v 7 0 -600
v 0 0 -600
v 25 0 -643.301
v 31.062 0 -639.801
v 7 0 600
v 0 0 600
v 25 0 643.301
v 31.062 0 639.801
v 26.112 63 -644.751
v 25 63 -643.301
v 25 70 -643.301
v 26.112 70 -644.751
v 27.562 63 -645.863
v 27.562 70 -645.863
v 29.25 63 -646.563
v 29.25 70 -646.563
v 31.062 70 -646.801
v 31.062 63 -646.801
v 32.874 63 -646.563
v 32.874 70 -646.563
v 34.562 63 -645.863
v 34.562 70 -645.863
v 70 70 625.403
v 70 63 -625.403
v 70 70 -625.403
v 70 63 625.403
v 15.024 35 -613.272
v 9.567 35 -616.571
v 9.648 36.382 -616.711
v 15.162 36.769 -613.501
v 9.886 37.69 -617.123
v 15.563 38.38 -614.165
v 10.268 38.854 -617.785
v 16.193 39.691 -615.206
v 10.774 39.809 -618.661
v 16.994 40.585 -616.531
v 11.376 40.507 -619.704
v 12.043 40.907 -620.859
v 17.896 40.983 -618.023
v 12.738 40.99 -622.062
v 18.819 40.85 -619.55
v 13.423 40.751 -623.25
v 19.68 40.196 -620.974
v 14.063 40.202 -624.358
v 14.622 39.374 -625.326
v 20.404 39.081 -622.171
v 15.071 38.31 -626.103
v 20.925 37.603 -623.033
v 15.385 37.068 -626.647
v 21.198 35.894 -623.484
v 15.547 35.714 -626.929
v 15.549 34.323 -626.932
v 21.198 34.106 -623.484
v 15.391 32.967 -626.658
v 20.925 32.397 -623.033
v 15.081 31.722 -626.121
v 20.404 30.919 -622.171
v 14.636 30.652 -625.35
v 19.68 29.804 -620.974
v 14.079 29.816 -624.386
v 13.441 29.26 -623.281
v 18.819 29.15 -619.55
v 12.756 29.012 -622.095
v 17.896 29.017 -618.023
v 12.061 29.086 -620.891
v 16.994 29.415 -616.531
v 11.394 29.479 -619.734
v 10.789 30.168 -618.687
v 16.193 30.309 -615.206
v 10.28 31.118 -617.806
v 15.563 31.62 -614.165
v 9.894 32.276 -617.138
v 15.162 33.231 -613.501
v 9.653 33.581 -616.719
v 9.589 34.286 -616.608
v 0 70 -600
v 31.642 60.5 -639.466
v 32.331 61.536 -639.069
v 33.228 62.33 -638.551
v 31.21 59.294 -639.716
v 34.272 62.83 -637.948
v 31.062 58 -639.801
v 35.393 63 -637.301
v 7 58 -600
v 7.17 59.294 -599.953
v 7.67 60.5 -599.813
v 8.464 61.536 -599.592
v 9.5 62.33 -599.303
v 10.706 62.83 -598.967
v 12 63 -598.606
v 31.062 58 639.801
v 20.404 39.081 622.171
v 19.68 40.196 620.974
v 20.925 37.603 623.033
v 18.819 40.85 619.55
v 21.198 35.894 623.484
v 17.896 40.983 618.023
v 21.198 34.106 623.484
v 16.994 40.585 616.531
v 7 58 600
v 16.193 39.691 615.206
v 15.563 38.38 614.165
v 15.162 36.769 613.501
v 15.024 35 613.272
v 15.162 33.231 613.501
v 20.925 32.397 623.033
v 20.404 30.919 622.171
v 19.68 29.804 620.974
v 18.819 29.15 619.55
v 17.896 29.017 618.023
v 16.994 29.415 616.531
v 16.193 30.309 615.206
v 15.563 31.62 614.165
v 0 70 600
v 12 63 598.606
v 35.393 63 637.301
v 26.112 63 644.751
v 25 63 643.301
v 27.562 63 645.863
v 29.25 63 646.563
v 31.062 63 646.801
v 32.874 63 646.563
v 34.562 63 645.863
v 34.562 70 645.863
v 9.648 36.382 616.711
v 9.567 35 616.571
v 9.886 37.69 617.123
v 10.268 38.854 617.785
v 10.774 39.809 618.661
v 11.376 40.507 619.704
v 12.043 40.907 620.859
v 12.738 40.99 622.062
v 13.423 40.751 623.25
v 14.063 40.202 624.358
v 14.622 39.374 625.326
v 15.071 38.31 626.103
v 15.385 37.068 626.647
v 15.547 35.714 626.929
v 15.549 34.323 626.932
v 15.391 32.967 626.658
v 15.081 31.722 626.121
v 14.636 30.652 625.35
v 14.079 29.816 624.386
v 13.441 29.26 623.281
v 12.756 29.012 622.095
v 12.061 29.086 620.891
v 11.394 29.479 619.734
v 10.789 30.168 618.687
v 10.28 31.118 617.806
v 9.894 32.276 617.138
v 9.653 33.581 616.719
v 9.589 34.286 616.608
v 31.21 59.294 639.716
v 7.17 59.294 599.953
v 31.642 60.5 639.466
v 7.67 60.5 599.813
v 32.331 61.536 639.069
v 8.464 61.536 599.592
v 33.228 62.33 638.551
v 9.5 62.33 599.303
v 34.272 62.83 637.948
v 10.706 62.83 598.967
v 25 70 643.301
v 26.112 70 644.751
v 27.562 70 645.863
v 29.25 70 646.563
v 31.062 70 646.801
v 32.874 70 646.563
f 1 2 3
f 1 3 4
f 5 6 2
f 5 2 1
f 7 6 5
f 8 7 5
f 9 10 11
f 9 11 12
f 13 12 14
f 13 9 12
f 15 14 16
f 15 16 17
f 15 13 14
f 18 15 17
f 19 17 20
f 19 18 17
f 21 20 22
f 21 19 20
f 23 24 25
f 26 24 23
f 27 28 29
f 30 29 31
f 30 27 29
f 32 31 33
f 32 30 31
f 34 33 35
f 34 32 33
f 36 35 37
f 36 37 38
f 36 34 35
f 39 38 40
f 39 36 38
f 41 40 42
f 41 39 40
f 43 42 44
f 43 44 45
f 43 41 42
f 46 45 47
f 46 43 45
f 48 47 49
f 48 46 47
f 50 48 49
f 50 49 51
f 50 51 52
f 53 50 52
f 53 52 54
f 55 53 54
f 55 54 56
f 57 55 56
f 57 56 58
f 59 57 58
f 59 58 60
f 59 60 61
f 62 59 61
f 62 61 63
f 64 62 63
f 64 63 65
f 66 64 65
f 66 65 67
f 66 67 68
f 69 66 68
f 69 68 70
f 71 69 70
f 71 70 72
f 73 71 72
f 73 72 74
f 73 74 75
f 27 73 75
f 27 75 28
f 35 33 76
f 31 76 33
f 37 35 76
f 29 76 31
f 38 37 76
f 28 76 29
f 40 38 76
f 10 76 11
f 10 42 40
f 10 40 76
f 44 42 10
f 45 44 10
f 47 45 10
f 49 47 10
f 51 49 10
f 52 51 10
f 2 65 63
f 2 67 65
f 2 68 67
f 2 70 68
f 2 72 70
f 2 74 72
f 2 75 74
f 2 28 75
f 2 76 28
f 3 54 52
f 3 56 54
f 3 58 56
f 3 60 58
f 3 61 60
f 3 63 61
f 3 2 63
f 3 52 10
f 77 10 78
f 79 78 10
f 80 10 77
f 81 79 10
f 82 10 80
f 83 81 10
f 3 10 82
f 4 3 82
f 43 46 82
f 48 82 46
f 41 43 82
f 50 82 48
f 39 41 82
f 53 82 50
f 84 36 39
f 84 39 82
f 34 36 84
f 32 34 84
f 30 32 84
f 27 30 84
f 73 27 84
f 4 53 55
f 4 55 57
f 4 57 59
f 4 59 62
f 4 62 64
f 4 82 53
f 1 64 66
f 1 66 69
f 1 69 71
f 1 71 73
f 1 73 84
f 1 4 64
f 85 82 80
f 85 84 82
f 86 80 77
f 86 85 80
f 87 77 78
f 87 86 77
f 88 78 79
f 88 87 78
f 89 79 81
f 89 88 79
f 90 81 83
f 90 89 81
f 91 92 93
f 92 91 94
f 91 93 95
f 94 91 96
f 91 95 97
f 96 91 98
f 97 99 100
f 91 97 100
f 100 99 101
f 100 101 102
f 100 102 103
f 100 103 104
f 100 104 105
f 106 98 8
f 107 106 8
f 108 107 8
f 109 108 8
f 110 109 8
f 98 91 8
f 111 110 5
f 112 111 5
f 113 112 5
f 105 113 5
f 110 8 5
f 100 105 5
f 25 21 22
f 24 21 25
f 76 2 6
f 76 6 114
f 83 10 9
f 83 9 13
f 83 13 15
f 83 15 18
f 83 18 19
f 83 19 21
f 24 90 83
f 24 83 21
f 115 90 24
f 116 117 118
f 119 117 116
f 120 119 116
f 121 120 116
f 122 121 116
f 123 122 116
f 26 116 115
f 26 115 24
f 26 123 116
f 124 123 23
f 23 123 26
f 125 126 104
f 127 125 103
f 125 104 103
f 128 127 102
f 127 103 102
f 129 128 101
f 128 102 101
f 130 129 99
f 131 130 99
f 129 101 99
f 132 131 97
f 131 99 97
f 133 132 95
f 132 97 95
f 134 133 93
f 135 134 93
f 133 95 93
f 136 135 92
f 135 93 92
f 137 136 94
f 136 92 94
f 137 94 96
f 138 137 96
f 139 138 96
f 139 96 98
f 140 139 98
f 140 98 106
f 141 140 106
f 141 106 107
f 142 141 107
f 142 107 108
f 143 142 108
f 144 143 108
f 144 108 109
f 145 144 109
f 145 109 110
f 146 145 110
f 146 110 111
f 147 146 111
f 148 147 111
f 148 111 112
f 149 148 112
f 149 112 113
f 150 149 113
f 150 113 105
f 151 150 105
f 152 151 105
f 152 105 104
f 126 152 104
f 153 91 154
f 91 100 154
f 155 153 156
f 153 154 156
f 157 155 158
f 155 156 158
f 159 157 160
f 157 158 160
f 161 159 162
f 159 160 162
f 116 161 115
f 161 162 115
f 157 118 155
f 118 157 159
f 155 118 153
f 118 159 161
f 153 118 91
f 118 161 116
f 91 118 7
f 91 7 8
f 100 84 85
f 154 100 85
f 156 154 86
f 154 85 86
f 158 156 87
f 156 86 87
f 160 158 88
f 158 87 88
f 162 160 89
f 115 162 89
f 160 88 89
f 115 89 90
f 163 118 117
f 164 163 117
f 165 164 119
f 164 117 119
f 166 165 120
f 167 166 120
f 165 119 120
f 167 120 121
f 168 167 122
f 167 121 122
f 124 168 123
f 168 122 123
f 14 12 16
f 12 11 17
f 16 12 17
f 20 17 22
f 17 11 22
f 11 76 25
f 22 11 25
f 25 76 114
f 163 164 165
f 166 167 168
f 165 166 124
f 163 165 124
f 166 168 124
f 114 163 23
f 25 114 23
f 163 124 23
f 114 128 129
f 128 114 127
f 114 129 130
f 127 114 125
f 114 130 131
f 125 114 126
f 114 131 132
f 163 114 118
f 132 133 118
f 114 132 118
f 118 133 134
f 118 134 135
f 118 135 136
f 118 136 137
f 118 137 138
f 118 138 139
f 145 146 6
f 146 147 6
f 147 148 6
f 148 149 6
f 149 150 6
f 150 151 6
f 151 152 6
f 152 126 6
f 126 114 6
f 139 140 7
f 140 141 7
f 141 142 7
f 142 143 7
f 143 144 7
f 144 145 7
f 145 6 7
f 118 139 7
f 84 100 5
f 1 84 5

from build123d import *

# Parameters (mm, degrees)
BOSS_EXTRUDE1_DEPTH = 600
BOSS_EXTRUDE2_DEPTH = 63
BOSS_EXTRUDE4_DEPTH = 7
SKETCH10_R          = 6
CUT_EXTRUDE3_DEPTH  = 7
FILLET5_R           = 5


with BuildPart() as part:
    # Sketch1 → Boss-Extrude1 (new body)
    with BuildSketch(Plane.XY):
        Polygon((0, 0), (0, 70), (70, 70), (70, 63), (7, 63), (7, 0), align=None)
    extrude(amount=BOSS_EXTRUDE1_DEPTH)

    # Sketch2 → Boss-Extrude2 (add)
    with BuildSketch(Plane(origin=(0, 0, 0), x_dir=(1, 0, 0), z_dir=(0, 1, 0))):
        Polygon((0, -600), (25, -643.301270189), (31.062177826, -639.801270189), (7, -600), align=None)
    extrude(amount=BOSS_EXTRUDE2_DEPTH)

    # Sketch9 → Boss-Extrude4 (add)
    with BuildSketch(Plane(origin=(0, 63, 0), x_dir=(1, 0, 0), z_dir=(0, 1, 0))):
        with BuildLine():
            Line((0, -600), (25, -643.301270189))
            ThreePointArc((25, -643.301270189), (29.250444511, -646.562750973), (34.562177826, -645.863448016))
            Line((34.562177826, -645.863448016), (70, -625.403411844))
            Line((70, -625.403411844), (70, -600))
            Line((70, -600), (0, -600))
        make_face()
    extrude(amount=BOSS_EXTRUDE4_DEPTH)

    # Sketch10 → Cut-Extrude3 (cut)
    with BuildSketch(Plane(origin=(-260.517992164, 0, 157.498246278), x_dir=(-0.5173609804017633, 0, -0.8557672674026079), z_dir=(0.8557672674026079, 0, -0.5173609804017633))):
        with Locations((-538.591343444, 35)):
            Circle(SKETCH10_R)
    extrude(amount=-CUT_EXTRUDE3_DEPTH, mode=Mode.SUBTRACT)

    # Fillet5
    fillet5_edges = [part.edges().sort_by_distance(p)[0] for p in [
        (7, 63, 300),
        (19.031088913, 63, 619.900635095),
    ]]
    fillet(fillet5_edges, radius=FILLET5_R)

    # Mirror6: part across plane


with BuildPart() as part_1:
    add(part.part)
    add(part.part.mirror(Plane.XY))


solid = part_1.part
